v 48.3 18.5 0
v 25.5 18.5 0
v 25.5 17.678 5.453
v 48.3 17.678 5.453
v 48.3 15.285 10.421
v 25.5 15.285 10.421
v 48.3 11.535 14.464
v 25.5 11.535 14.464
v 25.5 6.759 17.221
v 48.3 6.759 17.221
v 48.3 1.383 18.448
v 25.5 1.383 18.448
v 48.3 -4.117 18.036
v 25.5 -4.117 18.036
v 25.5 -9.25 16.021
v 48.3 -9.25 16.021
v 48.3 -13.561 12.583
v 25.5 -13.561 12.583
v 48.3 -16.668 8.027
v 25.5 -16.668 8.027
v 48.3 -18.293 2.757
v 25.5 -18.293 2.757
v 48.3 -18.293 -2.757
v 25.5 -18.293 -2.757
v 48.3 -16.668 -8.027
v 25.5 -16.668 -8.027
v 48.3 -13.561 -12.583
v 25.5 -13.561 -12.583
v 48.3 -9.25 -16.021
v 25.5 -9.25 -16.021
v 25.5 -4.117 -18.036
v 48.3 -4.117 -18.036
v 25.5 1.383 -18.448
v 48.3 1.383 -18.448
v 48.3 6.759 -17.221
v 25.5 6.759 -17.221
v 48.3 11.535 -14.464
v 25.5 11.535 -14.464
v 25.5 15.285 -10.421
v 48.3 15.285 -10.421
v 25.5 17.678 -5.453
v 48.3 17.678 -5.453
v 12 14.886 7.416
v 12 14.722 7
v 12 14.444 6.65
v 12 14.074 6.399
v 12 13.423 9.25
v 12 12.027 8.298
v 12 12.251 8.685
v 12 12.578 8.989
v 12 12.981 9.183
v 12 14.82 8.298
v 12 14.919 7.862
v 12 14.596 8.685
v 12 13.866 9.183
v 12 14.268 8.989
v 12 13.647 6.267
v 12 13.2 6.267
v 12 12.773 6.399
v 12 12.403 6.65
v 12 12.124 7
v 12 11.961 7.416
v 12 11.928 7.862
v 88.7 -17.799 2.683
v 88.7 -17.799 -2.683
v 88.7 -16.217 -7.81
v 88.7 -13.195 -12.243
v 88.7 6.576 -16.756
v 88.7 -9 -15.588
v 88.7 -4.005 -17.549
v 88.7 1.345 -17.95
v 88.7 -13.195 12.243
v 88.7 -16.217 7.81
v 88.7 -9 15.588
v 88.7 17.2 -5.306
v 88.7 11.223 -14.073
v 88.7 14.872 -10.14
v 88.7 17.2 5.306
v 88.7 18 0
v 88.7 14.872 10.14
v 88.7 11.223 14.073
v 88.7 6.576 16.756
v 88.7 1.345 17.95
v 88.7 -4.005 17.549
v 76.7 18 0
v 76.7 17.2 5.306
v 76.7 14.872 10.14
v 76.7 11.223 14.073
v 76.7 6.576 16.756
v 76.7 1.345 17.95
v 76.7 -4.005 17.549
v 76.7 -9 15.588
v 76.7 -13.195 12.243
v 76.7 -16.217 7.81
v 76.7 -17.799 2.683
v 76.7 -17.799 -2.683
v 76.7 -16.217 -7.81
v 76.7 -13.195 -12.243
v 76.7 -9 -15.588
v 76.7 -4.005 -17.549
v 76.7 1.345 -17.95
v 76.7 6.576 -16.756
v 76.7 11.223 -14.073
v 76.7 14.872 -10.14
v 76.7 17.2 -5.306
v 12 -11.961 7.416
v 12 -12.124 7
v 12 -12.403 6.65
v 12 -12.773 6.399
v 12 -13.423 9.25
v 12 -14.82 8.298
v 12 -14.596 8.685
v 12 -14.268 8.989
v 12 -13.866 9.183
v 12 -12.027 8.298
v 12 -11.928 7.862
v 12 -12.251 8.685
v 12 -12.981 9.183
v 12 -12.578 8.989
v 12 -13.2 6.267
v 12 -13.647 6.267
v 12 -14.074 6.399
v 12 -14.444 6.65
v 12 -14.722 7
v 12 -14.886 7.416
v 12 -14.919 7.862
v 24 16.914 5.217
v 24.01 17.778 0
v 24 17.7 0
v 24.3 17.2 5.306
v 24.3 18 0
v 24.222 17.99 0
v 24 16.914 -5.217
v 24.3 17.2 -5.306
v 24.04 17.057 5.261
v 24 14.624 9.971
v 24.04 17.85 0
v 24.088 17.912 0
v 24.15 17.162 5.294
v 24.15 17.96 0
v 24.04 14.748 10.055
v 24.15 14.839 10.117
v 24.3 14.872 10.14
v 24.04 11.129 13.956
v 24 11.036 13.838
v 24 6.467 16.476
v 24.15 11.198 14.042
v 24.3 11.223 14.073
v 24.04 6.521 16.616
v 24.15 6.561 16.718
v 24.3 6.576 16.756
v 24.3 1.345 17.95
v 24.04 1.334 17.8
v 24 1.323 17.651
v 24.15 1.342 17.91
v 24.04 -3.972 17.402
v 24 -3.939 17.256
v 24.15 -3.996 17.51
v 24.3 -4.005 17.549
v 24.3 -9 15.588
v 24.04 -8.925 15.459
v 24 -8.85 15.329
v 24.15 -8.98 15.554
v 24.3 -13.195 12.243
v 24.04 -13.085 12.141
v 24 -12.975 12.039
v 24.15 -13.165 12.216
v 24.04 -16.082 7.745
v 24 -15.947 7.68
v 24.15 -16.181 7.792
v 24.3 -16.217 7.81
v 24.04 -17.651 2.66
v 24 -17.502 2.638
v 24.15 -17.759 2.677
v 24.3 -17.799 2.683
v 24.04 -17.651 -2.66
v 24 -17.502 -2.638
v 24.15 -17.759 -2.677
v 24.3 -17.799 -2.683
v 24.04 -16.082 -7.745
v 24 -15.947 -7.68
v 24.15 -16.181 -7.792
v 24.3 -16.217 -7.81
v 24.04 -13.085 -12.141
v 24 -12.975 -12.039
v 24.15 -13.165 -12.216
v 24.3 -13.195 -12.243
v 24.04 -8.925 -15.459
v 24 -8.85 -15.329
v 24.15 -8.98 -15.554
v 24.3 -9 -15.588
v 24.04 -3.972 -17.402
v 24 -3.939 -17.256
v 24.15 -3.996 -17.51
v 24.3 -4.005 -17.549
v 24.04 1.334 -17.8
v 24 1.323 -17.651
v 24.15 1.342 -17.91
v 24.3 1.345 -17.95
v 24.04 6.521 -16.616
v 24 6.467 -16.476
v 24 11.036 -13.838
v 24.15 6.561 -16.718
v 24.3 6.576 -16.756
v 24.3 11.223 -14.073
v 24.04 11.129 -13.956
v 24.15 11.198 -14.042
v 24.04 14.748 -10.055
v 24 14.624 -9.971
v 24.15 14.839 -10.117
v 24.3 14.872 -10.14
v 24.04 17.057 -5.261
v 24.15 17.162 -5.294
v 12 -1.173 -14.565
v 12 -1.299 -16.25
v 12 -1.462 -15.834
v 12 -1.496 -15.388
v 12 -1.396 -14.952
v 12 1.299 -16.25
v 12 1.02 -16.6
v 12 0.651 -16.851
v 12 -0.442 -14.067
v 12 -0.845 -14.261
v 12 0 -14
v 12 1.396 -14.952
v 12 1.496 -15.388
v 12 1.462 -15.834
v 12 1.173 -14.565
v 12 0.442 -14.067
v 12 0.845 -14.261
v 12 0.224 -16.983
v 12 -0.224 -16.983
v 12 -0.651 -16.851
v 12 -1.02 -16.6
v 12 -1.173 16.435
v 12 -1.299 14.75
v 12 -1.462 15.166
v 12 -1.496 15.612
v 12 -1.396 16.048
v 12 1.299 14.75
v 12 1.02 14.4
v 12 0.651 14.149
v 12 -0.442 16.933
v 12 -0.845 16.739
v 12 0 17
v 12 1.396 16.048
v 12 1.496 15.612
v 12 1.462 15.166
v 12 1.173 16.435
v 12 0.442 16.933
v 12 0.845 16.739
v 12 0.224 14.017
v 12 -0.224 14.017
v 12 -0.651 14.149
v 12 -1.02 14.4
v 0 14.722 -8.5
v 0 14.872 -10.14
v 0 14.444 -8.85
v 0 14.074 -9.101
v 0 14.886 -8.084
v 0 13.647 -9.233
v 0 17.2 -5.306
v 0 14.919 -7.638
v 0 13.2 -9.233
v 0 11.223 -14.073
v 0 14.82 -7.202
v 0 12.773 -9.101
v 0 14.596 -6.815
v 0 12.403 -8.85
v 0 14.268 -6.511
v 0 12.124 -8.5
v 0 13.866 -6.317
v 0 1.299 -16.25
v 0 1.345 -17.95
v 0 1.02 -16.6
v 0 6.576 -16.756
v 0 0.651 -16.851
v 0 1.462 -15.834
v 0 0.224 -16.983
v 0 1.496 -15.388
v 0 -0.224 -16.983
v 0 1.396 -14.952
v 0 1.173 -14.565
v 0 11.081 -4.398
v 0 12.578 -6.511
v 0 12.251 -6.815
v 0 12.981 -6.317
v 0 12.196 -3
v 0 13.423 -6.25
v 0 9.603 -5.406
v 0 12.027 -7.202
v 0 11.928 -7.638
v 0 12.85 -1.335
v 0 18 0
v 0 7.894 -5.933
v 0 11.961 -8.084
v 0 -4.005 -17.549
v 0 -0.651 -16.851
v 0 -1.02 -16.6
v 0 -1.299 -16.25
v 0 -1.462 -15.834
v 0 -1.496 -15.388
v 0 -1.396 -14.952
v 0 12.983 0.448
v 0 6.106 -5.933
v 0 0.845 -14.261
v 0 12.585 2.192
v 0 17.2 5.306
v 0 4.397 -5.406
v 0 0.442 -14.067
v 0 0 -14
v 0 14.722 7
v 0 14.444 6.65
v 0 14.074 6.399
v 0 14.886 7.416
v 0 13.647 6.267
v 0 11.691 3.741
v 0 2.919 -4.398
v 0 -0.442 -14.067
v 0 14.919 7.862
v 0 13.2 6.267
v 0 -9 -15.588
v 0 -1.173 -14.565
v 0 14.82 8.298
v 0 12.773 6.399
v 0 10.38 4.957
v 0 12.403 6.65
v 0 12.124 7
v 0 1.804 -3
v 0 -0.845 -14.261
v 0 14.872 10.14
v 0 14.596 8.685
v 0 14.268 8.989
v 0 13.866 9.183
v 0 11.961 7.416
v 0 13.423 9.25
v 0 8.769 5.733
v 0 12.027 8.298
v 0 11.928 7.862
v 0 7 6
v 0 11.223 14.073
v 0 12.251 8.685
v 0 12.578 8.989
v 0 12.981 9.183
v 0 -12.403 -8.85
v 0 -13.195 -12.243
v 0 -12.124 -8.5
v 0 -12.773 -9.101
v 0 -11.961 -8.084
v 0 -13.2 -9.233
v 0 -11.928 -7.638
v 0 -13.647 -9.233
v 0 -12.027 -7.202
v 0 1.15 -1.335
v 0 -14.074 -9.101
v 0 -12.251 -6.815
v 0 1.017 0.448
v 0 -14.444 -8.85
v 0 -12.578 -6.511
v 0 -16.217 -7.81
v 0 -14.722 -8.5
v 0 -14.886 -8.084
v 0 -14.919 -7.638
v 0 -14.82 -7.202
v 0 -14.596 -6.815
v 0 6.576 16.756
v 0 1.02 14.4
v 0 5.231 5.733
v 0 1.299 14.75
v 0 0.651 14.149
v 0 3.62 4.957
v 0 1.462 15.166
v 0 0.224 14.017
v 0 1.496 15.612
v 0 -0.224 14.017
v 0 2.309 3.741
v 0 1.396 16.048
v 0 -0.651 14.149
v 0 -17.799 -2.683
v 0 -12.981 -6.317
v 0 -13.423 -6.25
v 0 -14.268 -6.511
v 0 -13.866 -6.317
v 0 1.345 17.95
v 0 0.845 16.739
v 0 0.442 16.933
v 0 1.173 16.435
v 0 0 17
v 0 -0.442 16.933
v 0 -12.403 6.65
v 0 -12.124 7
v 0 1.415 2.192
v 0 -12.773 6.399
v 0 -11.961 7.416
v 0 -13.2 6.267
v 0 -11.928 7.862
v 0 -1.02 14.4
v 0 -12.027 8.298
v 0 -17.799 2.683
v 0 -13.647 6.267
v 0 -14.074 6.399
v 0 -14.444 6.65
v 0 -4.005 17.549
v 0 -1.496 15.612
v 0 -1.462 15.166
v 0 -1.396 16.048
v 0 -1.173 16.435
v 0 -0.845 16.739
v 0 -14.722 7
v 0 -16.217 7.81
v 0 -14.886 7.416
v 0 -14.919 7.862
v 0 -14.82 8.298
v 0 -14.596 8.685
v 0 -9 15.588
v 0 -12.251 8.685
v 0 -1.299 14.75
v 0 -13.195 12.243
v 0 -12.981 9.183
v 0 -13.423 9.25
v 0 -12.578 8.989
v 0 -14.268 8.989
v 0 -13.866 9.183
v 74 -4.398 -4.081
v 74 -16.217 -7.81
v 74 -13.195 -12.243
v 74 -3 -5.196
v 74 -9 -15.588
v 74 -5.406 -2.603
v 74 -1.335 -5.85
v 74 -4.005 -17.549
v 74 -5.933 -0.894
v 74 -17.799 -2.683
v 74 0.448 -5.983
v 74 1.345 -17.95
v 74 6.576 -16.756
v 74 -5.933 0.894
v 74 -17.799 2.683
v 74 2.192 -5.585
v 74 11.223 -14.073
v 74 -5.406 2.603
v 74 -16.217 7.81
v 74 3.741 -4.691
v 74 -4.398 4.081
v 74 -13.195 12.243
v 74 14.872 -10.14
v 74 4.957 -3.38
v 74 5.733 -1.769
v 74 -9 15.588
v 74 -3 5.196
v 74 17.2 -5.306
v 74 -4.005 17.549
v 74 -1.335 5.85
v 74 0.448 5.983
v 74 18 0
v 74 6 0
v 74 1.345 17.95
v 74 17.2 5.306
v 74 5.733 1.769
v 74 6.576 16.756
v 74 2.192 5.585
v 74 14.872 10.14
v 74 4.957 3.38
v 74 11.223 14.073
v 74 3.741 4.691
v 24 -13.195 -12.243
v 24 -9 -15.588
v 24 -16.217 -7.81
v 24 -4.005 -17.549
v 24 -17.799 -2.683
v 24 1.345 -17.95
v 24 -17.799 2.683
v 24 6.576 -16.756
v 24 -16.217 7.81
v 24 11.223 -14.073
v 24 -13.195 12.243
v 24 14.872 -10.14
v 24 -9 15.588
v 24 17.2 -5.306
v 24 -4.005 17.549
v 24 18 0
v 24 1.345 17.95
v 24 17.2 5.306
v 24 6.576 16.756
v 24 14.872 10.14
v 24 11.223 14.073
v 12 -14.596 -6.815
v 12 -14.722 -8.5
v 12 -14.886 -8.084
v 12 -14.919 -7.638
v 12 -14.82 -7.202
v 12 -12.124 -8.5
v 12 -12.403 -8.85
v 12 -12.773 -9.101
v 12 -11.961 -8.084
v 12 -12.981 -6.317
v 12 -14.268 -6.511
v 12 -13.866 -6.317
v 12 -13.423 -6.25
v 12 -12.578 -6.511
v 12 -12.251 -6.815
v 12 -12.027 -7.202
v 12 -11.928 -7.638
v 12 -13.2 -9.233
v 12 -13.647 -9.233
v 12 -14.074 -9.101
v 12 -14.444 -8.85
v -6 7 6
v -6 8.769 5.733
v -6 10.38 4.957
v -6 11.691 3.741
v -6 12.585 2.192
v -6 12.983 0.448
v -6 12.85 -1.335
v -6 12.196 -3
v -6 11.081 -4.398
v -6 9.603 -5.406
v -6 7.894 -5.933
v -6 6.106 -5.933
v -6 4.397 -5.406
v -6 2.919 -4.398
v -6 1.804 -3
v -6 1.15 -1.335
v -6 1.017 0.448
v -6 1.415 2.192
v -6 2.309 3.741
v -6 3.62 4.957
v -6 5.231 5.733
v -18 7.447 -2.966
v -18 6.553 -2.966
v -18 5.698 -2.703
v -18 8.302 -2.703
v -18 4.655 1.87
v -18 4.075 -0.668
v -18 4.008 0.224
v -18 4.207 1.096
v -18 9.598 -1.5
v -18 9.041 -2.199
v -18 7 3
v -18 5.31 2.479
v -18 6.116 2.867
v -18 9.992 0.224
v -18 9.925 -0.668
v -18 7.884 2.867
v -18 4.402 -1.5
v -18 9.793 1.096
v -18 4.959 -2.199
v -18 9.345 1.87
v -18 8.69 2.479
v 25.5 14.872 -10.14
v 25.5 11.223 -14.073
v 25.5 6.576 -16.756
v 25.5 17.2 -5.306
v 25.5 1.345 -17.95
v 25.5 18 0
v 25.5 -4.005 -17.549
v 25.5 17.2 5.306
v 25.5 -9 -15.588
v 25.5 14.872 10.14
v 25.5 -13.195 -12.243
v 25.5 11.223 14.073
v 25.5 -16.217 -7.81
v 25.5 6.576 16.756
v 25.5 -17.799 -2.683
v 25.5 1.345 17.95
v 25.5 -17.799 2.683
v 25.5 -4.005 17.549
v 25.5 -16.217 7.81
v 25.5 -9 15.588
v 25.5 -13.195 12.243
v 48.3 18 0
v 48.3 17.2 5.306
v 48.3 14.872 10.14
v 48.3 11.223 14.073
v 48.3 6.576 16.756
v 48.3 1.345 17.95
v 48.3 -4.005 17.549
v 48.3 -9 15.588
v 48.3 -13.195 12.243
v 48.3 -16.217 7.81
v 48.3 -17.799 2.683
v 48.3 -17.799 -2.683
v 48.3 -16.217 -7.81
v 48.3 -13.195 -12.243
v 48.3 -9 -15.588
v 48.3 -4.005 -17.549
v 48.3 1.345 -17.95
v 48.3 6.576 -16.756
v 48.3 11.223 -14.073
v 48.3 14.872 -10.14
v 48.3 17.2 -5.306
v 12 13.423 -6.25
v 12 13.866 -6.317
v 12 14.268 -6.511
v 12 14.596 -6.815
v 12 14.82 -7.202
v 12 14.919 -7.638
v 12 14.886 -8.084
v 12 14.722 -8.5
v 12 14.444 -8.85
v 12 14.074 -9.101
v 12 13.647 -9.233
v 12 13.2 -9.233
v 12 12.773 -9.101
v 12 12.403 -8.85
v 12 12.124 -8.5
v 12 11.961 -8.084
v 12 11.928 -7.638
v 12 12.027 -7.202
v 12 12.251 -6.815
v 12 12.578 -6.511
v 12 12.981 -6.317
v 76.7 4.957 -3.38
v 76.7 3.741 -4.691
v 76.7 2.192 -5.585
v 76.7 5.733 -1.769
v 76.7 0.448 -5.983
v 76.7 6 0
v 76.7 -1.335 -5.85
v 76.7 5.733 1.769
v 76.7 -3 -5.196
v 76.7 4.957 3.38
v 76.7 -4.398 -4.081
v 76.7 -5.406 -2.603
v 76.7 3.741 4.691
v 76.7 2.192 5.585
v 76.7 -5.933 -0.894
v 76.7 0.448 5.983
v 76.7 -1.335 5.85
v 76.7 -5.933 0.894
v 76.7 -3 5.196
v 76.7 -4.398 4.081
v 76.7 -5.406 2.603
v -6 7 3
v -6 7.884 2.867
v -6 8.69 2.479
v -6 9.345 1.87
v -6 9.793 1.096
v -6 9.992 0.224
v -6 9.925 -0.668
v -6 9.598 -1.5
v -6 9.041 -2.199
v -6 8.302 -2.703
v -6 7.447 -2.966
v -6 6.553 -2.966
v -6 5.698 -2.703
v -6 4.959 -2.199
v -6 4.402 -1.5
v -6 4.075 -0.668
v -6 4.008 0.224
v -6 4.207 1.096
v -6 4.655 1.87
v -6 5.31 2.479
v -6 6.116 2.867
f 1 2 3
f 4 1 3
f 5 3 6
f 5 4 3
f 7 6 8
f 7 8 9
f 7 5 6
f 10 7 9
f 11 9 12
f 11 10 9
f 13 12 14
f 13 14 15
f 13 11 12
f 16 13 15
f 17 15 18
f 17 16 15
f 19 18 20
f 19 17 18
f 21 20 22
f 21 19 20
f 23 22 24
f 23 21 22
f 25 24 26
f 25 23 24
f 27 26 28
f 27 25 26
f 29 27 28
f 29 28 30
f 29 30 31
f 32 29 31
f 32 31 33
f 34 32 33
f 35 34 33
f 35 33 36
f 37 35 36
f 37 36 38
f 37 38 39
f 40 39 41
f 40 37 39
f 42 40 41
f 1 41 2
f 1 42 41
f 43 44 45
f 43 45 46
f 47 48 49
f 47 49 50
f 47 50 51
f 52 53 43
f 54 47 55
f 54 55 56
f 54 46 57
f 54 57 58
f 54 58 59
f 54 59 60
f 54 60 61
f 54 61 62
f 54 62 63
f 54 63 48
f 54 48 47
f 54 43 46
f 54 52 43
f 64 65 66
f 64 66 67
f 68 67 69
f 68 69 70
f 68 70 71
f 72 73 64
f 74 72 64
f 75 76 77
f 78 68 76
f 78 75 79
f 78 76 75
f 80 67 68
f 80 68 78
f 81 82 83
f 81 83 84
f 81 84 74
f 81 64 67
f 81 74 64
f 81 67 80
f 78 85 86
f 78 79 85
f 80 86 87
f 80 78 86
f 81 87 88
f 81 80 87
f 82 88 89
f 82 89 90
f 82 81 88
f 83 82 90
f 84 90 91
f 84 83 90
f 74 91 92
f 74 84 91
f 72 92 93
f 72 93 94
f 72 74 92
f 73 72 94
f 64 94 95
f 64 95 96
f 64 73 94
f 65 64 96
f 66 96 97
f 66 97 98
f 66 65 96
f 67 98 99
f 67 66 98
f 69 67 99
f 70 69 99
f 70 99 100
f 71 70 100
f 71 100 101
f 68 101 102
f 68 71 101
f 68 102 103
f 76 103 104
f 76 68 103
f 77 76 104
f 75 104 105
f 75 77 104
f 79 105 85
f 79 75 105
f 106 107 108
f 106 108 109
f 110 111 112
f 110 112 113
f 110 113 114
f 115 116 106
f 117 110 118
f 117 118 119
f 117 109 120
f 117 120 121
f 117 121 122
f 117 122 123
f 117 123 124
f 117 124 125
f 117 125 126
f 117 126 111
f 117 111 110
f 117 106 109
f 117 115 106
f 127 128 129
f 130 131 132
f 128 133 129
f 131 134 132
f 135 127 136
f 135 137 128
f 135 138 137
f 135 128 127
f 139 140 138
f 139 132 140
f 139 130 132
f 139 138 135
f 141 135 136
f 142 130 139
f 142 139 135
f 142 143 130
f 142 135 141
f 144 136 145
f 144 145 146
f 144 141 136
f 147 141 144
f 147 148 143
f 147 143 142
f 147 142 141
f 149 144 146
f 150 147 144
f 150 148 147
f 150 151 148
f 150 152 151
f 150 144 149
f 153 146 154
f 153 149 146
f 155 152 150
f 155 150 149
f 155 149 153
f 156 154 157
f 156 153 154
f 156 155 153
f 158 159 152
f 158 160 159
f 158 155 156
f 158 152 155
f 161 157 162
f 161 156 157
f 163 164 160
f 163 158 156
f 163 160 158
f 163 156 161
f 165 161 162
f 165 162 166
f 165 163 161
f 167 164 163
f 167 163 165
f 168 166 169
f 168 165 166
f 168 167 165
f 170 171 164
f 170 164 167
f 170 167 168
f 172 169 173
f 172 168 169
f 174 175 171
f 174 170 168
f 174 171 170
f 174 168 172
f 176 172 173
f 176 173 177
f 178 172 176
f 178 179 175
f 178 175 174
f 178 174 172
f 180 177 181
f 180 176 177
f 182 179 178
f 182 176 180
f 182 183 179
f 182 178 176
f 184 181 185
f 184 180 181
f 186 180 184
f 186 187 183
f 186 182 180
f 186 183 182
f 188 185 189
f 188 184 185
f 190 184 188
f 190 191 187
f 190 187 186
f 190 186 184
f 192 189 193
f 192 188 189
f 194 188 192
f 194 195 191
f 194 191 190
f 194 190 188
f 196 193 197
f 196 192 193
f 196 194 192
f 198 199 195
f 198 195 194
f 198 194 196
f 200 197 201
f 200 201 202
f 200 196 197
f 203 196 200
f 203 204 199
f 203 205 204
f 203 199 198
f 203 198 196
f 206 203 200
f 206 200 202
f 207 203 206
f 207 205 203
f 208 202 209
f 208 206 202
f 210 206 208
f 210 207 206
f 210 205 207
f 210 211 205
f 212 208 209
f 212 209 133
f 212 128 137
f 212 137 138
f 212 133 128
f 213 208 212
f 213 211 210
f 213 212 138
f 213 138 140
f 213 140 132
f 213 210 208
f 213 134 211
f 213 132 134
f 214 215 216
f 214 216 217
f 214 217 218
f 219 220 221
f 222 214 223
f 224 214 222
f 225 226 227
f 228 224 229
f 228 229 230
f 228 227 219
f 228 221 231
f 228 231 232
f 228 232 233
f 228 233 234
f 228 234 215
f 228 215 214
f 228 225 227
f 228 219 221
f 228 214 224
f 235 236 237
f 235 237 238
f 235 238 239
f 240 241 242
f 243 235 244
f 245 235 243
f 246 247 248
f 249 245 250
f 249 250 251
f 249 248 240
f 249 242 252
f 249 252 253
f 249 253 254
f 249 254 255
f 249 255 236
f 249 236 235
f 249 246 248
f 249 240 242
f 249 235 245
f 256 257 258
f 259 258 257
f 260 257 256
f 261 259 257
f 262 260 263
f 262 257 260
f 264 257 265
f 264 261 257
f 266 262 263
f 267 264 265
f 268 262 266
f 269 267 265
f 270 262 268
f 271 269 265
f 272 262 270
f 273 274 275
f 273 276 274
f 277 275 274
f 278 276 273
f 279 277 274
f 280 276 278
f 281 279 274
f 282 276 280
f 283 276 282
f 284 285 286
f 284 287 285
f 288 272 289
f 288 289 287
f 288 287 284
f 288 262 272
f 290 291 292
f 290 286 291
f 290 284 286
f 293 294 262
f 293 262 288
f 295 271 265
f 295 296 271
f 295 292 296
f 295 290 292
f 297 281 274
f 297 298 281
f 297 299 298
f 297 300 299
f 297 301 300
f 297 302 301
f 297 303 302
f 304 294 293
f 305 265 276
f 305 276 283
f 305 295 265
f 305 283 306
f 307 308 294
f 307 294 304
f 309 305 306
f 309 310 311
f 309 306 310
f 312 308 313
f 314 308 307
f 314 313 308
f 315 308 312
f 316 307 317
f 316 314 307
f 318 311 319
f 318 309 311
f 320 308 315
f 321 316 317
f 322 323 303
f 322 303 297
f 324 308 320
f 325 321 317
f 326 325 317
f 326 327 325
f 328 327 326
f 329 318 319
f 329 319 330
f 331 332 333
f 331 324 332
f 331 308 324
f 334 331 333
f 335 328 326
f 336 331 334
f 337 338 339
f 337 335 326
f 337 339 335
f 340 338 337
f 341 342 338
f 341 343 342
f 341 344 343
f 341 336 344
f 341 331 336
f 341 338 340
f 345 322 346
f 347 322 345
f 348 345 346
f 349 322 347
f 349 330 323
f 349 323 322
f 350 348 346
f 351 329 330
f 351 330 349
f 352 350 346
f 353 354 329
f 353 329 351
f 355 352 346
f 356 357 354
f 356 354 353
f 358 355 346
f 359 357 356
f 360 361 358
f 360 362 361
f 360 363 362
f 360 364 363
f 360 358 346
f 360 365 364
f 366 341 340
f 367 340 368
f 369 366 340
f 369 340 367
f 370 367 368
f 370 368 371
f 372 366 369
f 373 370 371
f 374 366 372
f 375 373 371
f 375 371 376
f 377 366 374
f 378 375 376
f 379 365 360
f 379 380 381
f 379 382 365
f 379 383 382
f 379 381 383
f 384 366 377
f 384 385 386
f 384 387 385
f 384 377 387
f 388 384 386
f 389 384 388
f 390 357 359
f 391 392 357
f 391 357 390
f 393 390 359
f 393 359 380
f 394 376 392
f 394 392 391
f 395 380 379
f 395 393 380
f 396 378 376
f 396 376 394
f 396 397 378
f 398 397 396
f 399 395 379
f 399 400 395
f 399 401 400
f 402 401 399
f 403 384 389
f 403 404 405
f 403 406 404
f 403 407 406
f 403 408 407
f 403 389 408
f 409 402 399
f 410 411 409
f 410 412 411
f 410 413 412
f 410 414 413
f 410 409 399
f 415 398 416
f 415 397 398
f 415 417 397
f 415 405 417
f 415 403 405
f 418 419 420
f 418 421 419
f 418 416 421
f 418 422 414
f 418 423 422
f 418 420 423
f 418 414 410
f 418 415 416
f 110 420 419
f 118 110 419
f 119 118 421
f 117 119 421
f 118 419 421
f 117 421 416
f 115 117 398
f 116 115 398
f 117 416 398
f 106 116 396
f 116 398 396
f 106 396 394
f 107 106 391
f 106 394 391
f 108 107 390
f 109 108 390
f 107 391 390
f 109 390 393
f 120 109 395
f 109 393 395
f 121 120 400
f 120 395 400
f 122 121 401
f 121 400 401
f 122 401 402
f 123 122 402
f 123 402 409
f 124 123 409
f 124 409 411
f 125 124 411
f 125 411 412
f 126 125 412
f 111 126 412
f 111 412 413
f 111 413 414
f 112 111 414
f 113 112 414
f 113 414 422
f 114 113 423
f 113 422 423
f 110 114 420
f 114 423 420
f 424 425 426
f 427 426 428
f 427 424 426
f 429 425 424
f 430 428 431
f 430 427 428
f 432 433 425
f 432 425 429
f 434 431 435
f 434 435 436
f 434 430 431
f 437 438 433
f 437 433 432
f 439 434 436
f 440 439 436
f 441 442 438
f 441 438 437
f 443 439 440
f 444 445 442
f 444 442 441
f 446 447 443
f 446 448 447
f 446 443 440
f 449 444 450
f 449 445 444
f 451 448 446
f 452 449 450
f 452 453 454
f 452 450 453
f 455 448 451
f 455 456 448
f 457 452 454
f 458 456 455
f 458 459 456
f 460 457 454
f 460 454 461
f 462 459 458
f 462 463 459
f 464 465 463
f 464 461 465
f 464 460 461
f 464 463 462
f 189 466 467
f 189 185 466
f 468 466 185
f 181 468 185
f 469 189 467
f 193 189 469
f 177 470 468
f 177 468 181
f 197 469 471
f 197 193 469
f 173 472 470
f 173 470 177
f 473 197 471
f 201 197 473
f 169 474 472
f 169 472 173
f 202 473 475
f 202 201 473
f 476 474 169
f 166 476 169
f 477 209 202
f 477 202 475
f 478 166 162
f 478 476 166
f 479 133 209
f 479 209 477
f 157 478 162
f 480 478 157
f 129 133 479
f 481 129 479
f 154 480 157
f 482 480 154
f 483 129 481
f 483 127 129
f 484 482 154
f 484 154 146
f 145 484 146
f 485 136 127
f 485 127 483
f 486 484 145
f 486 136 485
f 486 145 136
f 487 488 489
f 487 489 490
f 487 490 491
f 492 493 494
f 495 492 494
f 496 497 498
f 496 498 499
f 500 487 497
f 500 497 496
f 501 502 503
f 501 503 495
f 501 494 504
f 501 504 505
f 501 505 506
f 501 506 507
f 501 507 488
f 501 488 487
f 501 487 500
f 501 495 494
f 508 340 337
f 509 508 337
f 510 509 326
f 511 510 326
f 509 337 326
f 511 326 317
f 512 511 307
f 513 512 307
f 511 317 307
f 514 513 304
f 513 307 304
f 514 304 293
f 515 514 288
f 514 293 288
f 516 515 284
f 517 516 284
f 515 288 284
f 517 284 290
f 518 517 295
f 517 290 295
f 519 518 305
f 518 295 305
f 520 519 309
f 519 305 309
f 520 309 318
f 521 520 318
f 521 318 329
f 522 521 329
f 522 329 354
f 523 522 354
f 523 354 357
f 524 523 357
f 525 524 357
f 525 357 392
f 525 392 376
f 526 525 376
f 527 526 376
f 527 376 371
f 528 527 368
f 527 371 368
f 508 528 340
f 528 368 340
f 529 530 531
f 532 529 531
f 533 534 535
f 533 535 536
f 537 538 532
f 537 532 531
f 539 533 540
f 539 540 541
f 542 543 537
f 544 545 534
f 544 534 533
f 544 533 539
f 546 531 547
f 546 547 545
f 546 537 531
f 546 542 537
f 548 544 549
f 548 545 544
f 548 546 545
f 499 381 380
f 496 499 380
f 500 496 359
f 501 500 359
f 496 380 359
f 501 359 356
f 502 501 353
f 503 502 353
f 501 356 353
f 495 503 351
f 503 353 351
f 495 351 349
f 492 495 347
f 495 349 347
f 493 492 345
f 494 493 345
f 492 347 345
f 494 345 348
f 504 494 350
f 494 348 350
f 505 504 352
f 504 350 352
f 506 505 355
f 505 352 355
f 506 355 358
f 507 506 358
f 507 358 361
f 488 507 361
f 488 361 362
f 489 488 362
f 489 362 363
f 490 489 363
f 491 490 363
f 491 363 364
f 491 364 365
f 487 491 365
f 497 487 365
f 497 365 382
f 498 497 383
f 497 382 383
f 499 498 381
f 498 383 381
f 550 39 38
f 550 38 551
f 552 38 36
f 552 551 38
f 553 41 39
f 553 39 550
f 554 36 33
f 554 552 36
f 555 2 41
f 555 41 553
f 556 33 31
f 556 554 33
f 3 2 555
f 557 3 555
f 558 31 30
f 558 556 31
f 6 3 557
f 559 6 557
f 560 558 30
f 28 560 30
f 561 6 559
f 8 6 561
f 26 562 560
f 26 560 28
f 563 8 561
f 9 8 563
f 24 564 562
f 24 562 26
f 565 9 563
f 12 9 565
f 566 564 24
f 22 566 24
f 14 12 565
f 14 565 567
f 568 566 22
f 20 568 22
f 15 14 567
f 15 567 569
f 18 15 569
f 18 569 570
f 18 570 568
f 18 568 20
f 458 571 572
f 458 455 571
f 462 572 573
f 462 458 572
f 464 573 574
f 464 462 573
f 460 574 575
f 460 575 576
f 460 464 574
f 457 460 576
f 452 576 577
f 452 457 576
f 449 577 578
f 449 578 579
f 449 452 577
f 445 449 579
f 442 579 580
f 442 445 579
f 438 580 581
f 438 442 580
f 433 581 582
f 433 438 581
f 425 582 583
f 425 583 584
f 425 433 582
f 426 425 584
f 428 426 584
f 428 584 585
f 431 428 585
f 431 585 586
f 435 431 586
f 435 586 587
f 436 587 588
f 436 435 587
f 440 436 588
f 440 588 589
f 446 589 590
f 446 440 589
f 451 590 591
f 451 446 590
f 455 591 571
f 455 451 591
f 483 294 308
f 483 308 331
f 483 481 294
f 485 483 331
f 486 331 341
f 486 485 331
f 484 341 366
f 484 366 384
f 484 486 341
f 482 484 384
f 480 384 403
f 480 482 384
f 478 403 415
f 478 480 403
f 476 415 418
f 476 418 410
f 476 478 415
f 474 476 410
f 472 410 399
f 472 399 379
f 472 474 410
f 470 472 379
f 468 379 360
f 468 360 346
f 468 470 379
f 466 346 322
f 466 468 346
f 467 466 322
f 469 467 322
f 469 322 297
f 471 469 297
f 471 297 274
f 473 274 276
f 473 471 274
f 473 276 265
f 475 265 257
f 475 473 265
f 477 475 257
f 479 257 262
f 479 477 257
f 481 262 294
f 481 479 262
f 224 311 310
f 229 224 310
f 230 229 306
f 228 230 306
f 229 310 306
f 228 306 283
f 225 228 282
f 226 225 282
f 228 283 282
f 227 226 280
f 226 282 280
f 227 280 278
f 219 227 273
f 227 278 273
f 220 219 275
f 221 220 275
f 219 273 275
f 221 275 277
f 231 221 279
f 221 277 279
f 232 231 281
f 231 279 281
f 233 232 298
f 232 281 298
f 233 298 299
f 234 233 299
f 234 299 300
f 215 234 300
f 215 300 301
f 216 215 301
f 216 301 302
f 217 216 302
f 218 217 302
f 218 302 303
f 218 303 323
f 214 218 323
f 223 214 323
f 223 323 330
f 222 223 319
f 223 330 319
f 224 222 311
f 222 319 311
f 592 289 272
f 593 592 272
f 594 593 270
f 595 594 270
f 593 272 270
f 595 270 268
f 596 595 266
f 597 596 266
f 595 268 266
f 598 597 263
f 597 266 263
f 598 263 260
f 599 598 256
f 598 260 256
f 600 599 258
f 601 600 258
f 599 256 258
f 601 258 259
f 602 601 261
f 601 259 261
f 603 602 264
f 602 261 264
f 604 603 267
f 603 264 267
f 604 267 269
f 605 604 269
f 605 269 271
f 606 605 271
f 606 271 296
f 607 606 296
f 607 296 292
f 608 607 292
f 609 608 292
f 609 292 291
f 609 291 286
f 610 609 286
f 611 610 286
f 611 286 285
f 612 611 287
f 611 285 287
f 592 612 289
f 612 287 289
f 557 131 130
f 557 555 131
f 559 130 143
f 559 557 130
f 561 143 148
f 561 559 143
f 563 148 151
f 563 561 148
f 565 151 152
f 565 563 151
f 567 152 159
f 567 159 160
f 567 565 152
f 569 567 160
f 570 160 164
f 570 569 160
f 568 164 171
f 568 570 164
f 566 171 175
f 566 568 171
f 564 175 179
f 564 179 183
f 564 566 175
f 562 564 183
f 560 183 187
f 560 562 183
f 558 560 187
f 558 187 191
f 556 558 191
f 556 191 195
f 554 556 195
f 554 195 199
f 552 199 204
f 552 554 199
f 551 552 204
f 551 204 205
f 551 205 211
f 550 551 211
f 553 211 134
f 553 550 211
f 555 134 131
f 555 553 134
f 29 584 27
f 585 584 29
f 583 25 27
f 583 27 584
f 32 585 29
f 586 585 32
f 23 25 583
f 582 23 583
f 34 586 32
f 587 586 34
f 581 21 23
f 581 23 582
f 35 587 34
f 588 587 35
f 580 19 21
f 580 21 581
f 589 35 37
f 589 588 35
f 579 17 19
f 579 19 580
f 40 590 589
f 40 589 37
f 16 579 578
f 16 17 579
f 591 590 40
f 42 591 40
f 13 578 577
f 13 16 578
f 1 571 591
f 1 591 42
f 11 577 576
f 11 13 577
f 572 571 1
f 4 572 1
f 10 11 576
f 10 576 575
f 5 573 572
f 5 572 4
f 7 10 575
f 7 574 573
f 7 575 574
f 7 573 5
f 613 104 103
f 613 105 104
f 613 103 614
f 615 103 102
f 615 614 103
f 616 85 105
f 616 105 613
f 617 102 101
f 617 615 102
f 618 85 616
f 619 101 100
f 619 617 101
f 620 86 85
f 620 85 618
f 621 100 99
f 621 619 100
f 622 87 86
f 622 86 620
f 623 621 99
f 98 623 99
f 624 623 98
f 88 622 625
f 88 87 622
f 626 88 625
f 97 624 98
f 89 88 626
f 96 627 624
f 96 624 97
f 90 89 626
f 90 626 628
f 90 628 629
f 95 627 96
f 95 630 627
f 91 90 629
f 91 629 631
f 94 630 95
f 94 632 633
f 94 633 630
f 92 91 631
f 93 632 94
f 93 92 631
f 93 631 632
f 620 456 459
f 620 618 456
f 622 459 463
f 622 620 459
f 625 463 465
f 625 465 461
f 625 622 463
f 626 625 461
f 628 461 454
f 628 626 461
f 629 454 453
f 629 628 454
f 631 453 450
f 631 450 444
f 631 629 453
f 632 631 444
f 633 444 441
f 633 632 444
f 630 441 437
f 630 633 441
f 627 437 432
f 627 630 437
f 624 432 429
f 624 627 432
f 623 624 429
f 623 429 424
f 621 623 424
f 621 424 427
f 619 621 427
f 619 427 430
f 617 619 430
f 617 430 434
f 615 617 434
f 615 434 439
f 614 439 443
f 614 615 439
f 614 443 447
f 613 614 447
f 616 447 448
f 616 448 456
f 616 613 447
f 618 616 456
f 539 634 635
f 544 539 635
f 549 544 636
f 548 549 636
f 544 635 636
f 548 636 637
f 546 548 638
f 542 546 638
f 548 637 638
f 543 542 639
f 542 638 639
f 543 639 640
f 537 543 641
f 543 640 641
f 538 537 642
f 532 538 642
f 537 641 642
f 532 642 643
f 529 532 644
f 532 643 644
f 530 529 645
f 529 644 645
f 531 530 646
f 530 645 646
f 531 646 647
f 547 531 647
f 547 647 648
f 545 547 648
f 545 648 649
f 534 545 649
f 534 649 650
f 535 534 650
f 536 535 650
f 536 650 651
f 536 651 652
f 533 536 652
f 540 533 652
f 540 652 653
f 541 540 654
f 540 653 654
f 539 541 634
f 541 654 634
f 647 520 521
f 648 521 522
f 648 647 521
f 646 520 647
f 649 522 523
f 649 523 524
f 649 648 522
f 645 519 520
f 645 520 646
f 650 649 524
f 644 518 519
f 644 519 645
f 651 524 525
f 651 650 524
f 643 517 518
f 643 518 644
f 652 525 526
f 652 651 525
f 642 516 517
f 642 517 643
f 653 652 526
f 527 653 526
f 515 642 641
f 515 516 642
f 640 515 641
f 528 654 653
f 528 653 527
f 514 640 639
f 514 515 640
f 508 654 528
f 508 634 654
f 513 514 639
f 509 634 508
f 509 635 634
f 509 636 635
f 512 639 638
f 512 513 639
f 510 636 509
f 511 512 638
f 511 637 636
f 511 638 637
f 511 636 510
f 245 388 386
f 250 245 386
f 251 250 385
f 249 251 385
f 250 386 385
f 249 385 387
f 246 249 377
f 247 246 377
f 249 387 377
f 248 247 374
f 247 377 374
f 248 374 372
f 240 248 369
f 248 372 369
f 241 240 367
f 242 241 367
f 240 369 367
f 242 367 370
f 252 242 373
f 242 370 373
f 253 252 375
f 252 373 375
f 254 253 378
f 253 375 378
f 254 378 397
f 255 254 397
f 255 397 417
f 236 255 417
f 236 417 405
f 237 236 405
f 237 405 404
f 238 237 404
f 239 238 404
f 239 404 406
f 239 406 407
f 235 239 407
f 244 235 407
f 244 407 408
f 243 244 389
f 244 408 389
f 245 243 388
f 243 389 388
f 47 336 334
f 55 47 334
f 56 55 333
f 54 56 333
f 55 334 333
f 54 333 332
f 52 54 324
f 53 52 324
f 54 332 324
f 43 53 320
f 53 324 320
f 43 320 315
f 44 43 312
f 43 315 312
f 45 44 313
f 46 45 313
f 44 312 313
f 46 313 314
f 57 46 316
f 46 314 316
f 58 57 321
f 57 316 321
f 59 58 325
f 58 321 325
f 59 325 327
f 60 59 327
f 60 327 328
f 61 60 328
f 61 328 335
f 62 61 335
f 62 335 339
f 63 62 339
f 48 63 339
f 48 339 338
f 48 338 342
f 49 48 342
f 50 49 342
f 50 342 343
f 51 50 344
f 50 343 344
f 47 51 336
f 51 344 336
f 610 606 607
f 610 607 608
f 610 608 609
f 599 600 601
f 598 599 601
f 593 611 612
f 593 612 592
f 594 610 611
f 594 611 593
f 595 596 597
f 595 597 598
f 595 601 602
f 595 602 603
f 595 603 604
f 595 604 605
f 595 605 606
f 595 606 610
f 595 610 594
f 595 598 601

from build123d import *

# Parameters (mm, degrees)
SKETCH_6_R           = 6
EXTRUDE_3_DEPTH      = 6
SKETCH_7_R           = 3
EXTRUDE_4_DEPTH      = 12
SKETCH_8_R           = 1.5
CUT_EXTRUDE_22_DEPTH = 12


with BuildPart() as part:
    # 草图5 → 旋转1 (revolve)
    with BuildSketch(Plane.XY):
        with BuildLine():
            Line((0, 0), (0, 18))
            Line((0, 18), (24, 18))
            Line((24, 18), (24, 17.7))
            ThreePointArc((24, 17.7), (24.087867966, 17.912132034), (24.3, 18))
            Line((24.3, 18), (25.5, 18))
            Line((25.5, 18), (25.5, 18.5))
            Line((25.5, 18.5), (48.3, 18.5))
            Line((48.3, 18.5), (48.3, 18))
            Line((48.3, 18), (74, 18))
            Line((74, 18), (74, 6))
            Line((74, 6), (76.7, 6))
            Line((76.7, 6), (76.7, 18))
            Line((76.7, 18), (88.7, 18))
            Line((88.7, 18), (88.7, 0))
            Line((88.7, 0), (0, 0))
        make_face()
    revolve(axis=Axis((-65.679090957, 0, 0), (1, 0, 0)))

    # 草图6 → 凸台-拉伸3 (add)
    with BuildSketch(Plane.ZY):
        with Locations((0, 7)):
            Circle(SKETCH_6_R)
    extrude(amount=EXTRUDE_3_DEPTH)

    # 草图7 → 凸台-拉伸4 (add)
    with BuildSketch(Plane.ZY.offset(6)):
        with Locations((0, 7)):
            Circle(SKETCH_7_R)
    extrude(amount=EXTRUDE_4_DEPTH)

    # 草图8 → 切除-拉伸22 (cut)
    with BuildSketch(Plane.ZY):
        with Locations((15.5, 0)):
            Circle(SKETCH_8_R)
        with Locations((7.75, -13.423393759)):
            Circle(SKETCH_8_R)
        with Locations((-7.75, -13.423393759)):
            Circle(SKETCH_8_R)
        with Locations((-15.5, 0)):
            Circle(SKETCH_8_R)
        with Locations((-7.75, 13.423393759)):
            Circle(SKETCH_8_R)
        with Locations((7.75, 13.423393759)):
            Circle(SKETCH_8_R)
    extrude(amount=-CUT_EXTRUDE_22_DEPTH, mode=Mode.SUBTRACT)


solid = part.part
